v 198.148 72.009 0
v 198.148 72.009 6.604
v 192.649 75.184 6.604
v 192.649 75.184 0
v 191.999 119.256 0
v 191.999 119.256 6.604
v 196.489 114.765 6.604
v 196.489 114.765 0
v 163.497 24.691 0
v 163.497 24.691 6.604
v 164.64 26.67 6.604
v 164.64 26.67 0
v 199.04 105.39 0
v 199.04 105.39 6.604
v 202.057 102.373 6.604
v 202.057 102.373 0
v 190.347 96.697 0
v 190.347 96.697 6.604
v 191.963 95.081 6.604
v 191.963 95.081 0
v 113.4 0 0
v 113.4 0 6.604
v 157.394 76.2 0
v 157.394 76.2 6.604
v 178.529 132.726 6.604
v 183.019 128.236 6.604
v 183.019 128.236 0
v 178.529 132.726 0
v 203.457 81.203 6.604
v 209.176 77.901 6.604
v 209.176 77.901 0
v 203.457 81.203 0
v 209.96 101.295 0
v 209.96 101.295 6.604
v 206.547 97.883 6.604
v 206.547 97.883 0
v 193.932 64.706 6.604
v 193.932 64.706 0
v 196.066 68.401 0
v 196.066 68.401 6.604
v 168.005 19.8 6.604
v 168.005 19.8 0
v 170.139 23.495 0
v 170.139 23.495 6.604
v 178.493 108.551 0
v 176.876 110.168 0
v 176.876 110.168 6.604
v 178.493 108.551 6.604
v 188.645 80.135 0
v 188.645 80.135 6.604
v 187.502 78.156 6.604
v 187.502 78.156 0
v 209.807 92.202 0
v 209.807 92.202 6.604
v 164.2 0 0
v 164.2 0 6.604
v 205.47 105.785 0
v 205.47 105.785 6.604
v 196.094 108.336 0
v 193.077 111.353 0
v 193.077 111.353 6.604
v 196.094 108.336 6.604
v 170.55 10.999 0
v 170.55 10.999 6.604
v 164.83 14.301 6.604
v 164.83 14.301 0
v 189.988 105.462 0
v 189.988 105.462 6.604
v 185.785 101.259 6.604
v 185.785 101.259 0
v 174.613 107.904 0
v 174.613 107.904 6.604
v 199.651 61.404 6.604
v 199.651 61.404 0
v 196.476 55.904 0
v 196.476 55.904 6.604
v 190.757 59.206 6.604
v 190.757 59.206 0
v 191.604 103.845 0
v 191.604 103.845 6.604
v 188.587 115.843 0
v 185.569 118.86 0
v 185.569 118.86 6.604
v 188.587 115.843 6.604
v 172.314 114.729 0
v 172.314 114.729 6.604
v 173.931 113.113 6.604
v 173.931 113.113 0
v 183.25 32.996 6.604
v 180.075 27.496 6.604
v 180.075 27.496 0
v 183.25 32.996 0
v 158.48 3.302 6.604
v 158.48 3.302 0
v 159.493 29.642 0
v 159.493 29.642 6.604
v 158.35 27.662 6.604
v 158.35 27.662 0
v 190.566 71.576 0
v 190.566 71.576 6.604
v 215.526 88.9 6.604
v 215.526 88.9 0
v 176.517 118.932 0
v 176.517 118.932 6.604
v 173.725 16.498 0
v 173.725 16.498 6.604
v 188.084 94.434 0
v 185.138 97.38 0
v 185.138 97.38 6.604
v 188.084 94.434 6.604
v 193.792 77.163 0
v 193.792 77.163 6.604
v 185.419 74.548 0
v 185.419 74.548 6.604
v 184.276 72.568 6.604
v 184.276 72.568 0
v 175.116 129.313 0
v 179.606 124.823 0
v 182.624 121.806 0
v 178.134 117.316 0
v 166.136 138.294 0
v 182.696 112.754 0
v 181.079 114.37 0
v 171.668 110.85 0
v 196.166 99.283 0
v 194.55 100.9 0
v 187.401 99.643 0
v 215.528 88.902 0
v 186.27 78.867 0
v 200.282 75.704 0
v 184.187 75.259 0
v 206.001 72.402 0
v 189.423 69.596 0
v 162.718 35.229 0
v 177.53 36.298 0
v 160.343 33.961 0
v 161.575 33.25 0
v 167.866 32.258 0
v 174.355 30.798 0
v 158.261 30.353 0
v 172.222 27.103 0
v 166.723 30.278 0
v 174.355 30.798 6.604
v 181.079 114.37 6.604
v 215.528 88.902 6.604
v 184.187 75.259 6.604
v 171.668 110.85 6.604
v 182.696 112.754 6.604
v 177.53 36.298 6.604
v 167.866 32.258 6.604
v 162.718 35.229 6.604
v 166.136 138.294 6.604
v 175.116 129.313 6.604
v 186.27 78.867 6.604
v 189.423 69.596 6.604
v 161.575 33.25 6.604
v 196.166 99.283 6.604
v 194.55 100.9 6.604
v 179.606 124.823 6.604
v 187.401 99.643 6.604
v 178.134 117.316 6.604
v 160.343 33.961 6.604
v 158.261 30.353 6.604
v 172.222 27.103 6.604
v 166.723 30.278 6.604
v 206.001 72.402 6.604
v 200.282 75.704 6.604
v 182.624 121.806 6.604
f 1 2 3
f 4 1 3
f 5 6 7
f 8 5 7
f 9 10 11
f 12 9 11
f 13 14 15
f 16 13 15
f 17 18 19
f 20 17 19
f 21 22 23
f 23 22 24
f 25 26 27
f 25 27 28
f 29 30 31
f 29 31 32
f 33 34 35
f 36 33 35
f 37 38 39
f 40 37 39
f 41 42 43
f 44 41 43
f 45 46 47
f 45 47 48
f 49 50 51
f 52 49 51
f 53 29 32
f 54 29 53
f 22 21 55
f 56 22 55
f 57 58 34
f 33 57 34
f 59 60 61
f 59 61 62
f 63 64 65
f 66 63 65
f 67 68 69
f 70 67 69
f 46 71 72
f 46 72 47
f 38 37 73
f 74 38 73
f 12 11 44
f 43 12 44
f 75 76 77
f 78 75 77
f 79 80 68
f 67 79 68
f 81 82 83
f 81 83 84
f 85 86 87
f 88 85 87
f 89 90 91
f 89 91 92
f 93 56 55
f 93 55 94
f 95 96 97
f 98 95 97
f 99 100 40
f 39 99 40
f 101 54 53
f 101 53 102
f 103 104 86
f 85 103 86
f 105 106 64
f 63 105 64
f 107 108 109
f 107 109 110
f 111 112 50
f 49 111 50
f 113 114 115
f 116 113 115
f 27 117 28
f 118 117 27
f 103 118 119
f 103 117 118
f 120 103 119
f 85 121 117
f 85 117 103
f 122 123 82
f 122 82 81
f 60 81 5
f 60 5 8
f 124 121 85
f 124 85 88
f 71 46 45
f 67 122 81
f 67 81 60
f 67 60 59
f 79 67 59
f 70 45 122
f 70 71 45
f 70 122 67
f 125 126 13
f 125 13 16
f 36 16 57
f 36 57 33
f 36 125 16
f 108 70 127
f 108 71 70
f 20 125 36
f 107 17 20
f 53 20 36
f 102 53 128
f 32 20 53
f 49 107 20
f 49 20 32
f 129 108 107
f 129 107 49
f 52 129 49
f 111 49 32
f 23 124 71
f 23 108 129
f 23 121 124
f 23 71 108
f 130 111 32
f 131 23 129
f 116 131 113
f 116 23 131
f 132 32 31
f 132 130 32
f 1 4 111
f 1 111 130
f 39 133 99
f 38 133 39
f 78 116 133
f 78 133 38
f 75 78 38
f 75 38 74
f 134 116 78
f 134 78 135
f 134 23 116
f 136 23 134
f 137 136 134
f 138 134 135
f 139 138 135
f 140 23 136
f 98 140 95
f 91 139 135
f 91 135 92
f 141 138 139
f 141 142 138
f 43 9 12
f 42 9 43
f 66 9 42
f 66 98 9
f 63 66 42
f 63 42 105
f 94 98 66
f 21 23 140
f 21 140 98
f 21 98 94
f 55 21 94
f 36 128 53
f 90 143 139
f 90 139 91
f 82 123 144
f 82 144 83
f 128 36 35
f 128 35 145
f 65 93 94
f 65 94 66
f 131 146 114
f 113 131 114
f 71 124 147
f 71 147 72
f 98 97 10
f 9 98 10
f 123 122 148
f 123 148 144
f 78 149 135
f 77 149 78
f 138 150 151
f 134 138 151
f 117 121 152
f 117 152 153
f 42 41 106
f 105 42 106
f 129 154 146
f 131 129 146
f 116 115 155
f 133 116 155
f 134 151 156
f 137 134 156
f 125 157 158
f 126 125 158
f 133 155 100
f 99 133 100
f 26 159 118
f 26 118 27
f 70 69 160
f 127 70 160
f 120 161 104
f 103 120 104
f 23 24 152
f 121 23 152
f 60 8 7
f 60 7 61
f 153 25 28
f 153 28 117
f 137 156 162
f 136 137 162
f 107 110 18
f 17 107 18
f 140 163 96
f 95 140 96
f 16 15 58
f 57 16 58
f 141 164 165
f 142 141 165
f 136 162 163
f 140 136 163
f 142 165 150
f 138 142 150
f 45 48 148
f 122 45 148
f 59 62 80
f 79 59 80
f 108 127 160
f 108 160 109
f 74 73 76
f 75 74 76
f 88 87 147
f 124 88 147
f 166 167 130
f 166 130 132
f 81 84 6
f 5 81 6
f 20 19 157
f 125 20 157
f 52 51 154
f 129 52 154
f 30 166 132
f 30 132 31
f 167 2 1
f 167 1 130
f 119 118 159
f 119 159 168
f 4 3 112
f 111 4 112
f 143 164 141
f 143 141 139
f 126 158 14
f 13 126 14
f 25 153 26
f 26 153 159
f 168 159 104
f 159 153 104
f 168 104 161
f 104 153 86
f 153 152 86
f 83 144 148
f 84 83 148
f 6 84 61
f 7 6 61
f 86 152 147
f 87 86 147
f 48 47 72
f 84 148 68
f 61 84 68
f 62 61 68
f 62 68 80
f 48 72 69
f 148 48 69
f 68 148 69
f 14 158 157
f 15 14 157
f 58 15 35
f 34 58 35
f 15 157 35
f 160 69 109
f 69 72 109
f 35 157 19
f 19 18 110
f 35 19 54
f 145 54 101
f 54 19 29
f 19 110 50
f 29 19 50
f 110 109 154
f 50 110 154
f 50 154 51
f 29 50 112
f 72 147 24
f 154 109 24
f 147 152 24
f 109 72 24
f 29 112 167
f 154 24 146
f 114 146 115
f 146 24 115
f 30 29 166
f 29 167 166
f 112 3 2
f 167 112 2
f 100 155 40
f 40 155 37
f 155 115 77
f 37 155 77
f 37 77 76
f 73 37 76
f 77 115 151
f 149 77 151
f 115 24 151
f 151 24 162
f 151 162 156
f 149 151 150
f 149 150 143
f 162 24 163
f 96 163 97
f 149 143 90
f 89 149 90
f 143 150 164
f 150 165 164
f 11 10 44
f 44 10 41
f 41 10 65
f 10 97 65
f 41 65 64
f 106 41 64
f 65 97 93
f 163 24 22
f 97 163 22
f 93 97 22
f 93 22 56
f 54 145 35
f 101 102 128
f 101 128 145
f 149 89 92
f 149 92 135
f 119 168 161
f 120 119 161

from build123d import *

# Parameters (mm, degrees)
BOSS_EXTRUDE1_DEPTH = 6.604
MOVE_FACE2_BY       = 0.00254
CUT_EXTRUDE1_DEPTH  = 374.058010856
CUT_EXTRUDE2_DEPTH  = 257.166060573
CUT_EXTRUDE3_DEPTH  = 257.166060573
BOSS_EXTRUDE2_DEPTH = 6.604


with BuildPart() as part:
    # Sketch1 → Boss-Extrude1 (new body)
    with BuildSketch(Plane.XY):
        Polygon((0, 304.426146906), (215.526146906, 88.9), (164.199707975, 0), (0, 0), (-164.199707975, 0), (-215.526146906, 88.9), align=None)
    extrude(amount=BOSS_EXTRUDE1_DEPTH)

    # Move Face2: a face moved outward by 0.00254
    extrude(part.faces().sort_by_distance((107.763073453, 196.663073453, 3.302))[0], amount=MOVE_FACE2_BY, dir=(0.707106781, 0.707106781, 0))

    # Sketch2 → Cut-Extrude1 (cut, through all)
    with BuildSketch(Plane.XY.offset(6.604)):
        Polygon((113.399707975, 0), (157.393798487, 76.2), (166.136053041, 138.293685968), (0.001796051, 304.427942957), (-215.526146906, 88.9), (-164.199707975, 0), align=None)
    extrude(amount=-CUT_EXTRUDE1_DEPTH, mode=Mode.SUBTRACT)

    # Sketch3 → Cut-Extrude2 (cut, through all)
    with BuildSketch(Plane.XY.offset(6.604)):
        Polygon((158.480476208, 3.302), (209.806915139, 92.202), (215.526146906, 88.9), (164.199707975, 0), align=None)
    extrude(amount=-CUT_EXTRUDE2_DEPTH, mode=Mode.SUBTRACT)

    # Sketch5 → Cut-Extrude3 (cut, through all)
    with BuildSketch(Plane.XY.offset(6.604)):
        Polygon((182.623803279, 121.805935729), (178.133675218, 117.315807669), (176.517229116, 118.932253771), (172.314469252, 114.729493906), (173.930915354, 113.113047804), (171.667890811, 110.850023262), (174.613414819, 107.904499254), (176.876439361, 110.167523796), (178.492885463, 108.551077695), (182.695645328, 112.753837559), (181.079199226, 114.370283661), (185.569327287, 118.860411722), align=None)
        Polygon((194.549583408, 100.899899479), (199.039711468, 105.39002754), (196.09418746, 108.335551548), (191.6040594, 103.845423487), (189.987613298, 105.461869589), (185.784853433, 101.259109724), (187.401299535, 99.642663622), (185.138274993, 97.37963908), (188.083799, 94.434115072), (190.346823543, 96.697139615), (191.963269645, 95.080693513), (196.166029509, 99.283453378), align=None)
        Polygon((198.148315139, 72.008712455), (192.649053825, 75.183712455), (193.792053825, 77.163446528), (188.644745235, 80.135246528), (187.501745235, 78.155512455), (186.269910701, 78.866712455), (184.187110701, 75.259197033), (185.418945235, 74.547997033), (184.275945235, 72.56826296), (189.423253825, 69.59646296), (190.566253825, 71.576197033), (196.065515139, 68.401197033), align=None)
        Polygon((172.221876208, 27.102802967), (166.722614894, 30.277802967), (167.865614894, 32.25753704), (162.718306304, 35.22933704), (161.575306304, 33.249602967), (160.34347177, 33.960802967), (158.26067177, 30.353287545), (159.492506304, 29.642087545), (158.349506304, 27.662353472), (163.496814894, 24.690553472), (164.639814894, 26.670287545), (170.139076208, 23.495287545), align=None)
    extrude(amount=-CUT_EXTRUDE3_DEPTH, mode=Mode.SUBTRACT)

    # Sketch6 → Boss-Extrude2 (add)
    with BuildSketch(Plane.XY.offset(6.604)):
        Polygon((178.528806488, 132.725927173), (175.116309162, 129.313429847), (179.606437222, 124.823301786), (183.018934548, 128.235799112), align=None)
        Polygon((188.586693343, 115.843045665), (191.999190669, 119.255542991), (196.48931873, 114.76541493), (193.076821404, 111.352917604), align=None)
        Polygon((205.469574851, 105.785158809), (209.959702911, 101.295030749), (206.547205585, 97.882533423), (202.057077525, 102.372661483), align=None)
        Polygon((209.176146906, 77.901477372), (203.456915139, 81.203477372), (200.281915139, 75.704216058), (206.001146906, 72.402216058), align=None)
        Polygon((193.931915139, 64.70569343), (199.651146906, 61.40369343), (196.476146906, 55.904432116), (190.756915139, 59.206432116), align=None)
        Polygon((183.249707975, 32.995567884), (177.530476208, 36.297567884), (174.355476208, 30.79830657), (180.074707975, 27.49630657), align=None)
        Polygon((168.005476208, 19.799783942), (173.724707975, 16.497783942), (170.549707975, 10.998522628), (164.830476208, 14.300522628), align=None)
    extrude(amount=-BOSS_EXTRUDE2_DEPTH)


solid = part.part
